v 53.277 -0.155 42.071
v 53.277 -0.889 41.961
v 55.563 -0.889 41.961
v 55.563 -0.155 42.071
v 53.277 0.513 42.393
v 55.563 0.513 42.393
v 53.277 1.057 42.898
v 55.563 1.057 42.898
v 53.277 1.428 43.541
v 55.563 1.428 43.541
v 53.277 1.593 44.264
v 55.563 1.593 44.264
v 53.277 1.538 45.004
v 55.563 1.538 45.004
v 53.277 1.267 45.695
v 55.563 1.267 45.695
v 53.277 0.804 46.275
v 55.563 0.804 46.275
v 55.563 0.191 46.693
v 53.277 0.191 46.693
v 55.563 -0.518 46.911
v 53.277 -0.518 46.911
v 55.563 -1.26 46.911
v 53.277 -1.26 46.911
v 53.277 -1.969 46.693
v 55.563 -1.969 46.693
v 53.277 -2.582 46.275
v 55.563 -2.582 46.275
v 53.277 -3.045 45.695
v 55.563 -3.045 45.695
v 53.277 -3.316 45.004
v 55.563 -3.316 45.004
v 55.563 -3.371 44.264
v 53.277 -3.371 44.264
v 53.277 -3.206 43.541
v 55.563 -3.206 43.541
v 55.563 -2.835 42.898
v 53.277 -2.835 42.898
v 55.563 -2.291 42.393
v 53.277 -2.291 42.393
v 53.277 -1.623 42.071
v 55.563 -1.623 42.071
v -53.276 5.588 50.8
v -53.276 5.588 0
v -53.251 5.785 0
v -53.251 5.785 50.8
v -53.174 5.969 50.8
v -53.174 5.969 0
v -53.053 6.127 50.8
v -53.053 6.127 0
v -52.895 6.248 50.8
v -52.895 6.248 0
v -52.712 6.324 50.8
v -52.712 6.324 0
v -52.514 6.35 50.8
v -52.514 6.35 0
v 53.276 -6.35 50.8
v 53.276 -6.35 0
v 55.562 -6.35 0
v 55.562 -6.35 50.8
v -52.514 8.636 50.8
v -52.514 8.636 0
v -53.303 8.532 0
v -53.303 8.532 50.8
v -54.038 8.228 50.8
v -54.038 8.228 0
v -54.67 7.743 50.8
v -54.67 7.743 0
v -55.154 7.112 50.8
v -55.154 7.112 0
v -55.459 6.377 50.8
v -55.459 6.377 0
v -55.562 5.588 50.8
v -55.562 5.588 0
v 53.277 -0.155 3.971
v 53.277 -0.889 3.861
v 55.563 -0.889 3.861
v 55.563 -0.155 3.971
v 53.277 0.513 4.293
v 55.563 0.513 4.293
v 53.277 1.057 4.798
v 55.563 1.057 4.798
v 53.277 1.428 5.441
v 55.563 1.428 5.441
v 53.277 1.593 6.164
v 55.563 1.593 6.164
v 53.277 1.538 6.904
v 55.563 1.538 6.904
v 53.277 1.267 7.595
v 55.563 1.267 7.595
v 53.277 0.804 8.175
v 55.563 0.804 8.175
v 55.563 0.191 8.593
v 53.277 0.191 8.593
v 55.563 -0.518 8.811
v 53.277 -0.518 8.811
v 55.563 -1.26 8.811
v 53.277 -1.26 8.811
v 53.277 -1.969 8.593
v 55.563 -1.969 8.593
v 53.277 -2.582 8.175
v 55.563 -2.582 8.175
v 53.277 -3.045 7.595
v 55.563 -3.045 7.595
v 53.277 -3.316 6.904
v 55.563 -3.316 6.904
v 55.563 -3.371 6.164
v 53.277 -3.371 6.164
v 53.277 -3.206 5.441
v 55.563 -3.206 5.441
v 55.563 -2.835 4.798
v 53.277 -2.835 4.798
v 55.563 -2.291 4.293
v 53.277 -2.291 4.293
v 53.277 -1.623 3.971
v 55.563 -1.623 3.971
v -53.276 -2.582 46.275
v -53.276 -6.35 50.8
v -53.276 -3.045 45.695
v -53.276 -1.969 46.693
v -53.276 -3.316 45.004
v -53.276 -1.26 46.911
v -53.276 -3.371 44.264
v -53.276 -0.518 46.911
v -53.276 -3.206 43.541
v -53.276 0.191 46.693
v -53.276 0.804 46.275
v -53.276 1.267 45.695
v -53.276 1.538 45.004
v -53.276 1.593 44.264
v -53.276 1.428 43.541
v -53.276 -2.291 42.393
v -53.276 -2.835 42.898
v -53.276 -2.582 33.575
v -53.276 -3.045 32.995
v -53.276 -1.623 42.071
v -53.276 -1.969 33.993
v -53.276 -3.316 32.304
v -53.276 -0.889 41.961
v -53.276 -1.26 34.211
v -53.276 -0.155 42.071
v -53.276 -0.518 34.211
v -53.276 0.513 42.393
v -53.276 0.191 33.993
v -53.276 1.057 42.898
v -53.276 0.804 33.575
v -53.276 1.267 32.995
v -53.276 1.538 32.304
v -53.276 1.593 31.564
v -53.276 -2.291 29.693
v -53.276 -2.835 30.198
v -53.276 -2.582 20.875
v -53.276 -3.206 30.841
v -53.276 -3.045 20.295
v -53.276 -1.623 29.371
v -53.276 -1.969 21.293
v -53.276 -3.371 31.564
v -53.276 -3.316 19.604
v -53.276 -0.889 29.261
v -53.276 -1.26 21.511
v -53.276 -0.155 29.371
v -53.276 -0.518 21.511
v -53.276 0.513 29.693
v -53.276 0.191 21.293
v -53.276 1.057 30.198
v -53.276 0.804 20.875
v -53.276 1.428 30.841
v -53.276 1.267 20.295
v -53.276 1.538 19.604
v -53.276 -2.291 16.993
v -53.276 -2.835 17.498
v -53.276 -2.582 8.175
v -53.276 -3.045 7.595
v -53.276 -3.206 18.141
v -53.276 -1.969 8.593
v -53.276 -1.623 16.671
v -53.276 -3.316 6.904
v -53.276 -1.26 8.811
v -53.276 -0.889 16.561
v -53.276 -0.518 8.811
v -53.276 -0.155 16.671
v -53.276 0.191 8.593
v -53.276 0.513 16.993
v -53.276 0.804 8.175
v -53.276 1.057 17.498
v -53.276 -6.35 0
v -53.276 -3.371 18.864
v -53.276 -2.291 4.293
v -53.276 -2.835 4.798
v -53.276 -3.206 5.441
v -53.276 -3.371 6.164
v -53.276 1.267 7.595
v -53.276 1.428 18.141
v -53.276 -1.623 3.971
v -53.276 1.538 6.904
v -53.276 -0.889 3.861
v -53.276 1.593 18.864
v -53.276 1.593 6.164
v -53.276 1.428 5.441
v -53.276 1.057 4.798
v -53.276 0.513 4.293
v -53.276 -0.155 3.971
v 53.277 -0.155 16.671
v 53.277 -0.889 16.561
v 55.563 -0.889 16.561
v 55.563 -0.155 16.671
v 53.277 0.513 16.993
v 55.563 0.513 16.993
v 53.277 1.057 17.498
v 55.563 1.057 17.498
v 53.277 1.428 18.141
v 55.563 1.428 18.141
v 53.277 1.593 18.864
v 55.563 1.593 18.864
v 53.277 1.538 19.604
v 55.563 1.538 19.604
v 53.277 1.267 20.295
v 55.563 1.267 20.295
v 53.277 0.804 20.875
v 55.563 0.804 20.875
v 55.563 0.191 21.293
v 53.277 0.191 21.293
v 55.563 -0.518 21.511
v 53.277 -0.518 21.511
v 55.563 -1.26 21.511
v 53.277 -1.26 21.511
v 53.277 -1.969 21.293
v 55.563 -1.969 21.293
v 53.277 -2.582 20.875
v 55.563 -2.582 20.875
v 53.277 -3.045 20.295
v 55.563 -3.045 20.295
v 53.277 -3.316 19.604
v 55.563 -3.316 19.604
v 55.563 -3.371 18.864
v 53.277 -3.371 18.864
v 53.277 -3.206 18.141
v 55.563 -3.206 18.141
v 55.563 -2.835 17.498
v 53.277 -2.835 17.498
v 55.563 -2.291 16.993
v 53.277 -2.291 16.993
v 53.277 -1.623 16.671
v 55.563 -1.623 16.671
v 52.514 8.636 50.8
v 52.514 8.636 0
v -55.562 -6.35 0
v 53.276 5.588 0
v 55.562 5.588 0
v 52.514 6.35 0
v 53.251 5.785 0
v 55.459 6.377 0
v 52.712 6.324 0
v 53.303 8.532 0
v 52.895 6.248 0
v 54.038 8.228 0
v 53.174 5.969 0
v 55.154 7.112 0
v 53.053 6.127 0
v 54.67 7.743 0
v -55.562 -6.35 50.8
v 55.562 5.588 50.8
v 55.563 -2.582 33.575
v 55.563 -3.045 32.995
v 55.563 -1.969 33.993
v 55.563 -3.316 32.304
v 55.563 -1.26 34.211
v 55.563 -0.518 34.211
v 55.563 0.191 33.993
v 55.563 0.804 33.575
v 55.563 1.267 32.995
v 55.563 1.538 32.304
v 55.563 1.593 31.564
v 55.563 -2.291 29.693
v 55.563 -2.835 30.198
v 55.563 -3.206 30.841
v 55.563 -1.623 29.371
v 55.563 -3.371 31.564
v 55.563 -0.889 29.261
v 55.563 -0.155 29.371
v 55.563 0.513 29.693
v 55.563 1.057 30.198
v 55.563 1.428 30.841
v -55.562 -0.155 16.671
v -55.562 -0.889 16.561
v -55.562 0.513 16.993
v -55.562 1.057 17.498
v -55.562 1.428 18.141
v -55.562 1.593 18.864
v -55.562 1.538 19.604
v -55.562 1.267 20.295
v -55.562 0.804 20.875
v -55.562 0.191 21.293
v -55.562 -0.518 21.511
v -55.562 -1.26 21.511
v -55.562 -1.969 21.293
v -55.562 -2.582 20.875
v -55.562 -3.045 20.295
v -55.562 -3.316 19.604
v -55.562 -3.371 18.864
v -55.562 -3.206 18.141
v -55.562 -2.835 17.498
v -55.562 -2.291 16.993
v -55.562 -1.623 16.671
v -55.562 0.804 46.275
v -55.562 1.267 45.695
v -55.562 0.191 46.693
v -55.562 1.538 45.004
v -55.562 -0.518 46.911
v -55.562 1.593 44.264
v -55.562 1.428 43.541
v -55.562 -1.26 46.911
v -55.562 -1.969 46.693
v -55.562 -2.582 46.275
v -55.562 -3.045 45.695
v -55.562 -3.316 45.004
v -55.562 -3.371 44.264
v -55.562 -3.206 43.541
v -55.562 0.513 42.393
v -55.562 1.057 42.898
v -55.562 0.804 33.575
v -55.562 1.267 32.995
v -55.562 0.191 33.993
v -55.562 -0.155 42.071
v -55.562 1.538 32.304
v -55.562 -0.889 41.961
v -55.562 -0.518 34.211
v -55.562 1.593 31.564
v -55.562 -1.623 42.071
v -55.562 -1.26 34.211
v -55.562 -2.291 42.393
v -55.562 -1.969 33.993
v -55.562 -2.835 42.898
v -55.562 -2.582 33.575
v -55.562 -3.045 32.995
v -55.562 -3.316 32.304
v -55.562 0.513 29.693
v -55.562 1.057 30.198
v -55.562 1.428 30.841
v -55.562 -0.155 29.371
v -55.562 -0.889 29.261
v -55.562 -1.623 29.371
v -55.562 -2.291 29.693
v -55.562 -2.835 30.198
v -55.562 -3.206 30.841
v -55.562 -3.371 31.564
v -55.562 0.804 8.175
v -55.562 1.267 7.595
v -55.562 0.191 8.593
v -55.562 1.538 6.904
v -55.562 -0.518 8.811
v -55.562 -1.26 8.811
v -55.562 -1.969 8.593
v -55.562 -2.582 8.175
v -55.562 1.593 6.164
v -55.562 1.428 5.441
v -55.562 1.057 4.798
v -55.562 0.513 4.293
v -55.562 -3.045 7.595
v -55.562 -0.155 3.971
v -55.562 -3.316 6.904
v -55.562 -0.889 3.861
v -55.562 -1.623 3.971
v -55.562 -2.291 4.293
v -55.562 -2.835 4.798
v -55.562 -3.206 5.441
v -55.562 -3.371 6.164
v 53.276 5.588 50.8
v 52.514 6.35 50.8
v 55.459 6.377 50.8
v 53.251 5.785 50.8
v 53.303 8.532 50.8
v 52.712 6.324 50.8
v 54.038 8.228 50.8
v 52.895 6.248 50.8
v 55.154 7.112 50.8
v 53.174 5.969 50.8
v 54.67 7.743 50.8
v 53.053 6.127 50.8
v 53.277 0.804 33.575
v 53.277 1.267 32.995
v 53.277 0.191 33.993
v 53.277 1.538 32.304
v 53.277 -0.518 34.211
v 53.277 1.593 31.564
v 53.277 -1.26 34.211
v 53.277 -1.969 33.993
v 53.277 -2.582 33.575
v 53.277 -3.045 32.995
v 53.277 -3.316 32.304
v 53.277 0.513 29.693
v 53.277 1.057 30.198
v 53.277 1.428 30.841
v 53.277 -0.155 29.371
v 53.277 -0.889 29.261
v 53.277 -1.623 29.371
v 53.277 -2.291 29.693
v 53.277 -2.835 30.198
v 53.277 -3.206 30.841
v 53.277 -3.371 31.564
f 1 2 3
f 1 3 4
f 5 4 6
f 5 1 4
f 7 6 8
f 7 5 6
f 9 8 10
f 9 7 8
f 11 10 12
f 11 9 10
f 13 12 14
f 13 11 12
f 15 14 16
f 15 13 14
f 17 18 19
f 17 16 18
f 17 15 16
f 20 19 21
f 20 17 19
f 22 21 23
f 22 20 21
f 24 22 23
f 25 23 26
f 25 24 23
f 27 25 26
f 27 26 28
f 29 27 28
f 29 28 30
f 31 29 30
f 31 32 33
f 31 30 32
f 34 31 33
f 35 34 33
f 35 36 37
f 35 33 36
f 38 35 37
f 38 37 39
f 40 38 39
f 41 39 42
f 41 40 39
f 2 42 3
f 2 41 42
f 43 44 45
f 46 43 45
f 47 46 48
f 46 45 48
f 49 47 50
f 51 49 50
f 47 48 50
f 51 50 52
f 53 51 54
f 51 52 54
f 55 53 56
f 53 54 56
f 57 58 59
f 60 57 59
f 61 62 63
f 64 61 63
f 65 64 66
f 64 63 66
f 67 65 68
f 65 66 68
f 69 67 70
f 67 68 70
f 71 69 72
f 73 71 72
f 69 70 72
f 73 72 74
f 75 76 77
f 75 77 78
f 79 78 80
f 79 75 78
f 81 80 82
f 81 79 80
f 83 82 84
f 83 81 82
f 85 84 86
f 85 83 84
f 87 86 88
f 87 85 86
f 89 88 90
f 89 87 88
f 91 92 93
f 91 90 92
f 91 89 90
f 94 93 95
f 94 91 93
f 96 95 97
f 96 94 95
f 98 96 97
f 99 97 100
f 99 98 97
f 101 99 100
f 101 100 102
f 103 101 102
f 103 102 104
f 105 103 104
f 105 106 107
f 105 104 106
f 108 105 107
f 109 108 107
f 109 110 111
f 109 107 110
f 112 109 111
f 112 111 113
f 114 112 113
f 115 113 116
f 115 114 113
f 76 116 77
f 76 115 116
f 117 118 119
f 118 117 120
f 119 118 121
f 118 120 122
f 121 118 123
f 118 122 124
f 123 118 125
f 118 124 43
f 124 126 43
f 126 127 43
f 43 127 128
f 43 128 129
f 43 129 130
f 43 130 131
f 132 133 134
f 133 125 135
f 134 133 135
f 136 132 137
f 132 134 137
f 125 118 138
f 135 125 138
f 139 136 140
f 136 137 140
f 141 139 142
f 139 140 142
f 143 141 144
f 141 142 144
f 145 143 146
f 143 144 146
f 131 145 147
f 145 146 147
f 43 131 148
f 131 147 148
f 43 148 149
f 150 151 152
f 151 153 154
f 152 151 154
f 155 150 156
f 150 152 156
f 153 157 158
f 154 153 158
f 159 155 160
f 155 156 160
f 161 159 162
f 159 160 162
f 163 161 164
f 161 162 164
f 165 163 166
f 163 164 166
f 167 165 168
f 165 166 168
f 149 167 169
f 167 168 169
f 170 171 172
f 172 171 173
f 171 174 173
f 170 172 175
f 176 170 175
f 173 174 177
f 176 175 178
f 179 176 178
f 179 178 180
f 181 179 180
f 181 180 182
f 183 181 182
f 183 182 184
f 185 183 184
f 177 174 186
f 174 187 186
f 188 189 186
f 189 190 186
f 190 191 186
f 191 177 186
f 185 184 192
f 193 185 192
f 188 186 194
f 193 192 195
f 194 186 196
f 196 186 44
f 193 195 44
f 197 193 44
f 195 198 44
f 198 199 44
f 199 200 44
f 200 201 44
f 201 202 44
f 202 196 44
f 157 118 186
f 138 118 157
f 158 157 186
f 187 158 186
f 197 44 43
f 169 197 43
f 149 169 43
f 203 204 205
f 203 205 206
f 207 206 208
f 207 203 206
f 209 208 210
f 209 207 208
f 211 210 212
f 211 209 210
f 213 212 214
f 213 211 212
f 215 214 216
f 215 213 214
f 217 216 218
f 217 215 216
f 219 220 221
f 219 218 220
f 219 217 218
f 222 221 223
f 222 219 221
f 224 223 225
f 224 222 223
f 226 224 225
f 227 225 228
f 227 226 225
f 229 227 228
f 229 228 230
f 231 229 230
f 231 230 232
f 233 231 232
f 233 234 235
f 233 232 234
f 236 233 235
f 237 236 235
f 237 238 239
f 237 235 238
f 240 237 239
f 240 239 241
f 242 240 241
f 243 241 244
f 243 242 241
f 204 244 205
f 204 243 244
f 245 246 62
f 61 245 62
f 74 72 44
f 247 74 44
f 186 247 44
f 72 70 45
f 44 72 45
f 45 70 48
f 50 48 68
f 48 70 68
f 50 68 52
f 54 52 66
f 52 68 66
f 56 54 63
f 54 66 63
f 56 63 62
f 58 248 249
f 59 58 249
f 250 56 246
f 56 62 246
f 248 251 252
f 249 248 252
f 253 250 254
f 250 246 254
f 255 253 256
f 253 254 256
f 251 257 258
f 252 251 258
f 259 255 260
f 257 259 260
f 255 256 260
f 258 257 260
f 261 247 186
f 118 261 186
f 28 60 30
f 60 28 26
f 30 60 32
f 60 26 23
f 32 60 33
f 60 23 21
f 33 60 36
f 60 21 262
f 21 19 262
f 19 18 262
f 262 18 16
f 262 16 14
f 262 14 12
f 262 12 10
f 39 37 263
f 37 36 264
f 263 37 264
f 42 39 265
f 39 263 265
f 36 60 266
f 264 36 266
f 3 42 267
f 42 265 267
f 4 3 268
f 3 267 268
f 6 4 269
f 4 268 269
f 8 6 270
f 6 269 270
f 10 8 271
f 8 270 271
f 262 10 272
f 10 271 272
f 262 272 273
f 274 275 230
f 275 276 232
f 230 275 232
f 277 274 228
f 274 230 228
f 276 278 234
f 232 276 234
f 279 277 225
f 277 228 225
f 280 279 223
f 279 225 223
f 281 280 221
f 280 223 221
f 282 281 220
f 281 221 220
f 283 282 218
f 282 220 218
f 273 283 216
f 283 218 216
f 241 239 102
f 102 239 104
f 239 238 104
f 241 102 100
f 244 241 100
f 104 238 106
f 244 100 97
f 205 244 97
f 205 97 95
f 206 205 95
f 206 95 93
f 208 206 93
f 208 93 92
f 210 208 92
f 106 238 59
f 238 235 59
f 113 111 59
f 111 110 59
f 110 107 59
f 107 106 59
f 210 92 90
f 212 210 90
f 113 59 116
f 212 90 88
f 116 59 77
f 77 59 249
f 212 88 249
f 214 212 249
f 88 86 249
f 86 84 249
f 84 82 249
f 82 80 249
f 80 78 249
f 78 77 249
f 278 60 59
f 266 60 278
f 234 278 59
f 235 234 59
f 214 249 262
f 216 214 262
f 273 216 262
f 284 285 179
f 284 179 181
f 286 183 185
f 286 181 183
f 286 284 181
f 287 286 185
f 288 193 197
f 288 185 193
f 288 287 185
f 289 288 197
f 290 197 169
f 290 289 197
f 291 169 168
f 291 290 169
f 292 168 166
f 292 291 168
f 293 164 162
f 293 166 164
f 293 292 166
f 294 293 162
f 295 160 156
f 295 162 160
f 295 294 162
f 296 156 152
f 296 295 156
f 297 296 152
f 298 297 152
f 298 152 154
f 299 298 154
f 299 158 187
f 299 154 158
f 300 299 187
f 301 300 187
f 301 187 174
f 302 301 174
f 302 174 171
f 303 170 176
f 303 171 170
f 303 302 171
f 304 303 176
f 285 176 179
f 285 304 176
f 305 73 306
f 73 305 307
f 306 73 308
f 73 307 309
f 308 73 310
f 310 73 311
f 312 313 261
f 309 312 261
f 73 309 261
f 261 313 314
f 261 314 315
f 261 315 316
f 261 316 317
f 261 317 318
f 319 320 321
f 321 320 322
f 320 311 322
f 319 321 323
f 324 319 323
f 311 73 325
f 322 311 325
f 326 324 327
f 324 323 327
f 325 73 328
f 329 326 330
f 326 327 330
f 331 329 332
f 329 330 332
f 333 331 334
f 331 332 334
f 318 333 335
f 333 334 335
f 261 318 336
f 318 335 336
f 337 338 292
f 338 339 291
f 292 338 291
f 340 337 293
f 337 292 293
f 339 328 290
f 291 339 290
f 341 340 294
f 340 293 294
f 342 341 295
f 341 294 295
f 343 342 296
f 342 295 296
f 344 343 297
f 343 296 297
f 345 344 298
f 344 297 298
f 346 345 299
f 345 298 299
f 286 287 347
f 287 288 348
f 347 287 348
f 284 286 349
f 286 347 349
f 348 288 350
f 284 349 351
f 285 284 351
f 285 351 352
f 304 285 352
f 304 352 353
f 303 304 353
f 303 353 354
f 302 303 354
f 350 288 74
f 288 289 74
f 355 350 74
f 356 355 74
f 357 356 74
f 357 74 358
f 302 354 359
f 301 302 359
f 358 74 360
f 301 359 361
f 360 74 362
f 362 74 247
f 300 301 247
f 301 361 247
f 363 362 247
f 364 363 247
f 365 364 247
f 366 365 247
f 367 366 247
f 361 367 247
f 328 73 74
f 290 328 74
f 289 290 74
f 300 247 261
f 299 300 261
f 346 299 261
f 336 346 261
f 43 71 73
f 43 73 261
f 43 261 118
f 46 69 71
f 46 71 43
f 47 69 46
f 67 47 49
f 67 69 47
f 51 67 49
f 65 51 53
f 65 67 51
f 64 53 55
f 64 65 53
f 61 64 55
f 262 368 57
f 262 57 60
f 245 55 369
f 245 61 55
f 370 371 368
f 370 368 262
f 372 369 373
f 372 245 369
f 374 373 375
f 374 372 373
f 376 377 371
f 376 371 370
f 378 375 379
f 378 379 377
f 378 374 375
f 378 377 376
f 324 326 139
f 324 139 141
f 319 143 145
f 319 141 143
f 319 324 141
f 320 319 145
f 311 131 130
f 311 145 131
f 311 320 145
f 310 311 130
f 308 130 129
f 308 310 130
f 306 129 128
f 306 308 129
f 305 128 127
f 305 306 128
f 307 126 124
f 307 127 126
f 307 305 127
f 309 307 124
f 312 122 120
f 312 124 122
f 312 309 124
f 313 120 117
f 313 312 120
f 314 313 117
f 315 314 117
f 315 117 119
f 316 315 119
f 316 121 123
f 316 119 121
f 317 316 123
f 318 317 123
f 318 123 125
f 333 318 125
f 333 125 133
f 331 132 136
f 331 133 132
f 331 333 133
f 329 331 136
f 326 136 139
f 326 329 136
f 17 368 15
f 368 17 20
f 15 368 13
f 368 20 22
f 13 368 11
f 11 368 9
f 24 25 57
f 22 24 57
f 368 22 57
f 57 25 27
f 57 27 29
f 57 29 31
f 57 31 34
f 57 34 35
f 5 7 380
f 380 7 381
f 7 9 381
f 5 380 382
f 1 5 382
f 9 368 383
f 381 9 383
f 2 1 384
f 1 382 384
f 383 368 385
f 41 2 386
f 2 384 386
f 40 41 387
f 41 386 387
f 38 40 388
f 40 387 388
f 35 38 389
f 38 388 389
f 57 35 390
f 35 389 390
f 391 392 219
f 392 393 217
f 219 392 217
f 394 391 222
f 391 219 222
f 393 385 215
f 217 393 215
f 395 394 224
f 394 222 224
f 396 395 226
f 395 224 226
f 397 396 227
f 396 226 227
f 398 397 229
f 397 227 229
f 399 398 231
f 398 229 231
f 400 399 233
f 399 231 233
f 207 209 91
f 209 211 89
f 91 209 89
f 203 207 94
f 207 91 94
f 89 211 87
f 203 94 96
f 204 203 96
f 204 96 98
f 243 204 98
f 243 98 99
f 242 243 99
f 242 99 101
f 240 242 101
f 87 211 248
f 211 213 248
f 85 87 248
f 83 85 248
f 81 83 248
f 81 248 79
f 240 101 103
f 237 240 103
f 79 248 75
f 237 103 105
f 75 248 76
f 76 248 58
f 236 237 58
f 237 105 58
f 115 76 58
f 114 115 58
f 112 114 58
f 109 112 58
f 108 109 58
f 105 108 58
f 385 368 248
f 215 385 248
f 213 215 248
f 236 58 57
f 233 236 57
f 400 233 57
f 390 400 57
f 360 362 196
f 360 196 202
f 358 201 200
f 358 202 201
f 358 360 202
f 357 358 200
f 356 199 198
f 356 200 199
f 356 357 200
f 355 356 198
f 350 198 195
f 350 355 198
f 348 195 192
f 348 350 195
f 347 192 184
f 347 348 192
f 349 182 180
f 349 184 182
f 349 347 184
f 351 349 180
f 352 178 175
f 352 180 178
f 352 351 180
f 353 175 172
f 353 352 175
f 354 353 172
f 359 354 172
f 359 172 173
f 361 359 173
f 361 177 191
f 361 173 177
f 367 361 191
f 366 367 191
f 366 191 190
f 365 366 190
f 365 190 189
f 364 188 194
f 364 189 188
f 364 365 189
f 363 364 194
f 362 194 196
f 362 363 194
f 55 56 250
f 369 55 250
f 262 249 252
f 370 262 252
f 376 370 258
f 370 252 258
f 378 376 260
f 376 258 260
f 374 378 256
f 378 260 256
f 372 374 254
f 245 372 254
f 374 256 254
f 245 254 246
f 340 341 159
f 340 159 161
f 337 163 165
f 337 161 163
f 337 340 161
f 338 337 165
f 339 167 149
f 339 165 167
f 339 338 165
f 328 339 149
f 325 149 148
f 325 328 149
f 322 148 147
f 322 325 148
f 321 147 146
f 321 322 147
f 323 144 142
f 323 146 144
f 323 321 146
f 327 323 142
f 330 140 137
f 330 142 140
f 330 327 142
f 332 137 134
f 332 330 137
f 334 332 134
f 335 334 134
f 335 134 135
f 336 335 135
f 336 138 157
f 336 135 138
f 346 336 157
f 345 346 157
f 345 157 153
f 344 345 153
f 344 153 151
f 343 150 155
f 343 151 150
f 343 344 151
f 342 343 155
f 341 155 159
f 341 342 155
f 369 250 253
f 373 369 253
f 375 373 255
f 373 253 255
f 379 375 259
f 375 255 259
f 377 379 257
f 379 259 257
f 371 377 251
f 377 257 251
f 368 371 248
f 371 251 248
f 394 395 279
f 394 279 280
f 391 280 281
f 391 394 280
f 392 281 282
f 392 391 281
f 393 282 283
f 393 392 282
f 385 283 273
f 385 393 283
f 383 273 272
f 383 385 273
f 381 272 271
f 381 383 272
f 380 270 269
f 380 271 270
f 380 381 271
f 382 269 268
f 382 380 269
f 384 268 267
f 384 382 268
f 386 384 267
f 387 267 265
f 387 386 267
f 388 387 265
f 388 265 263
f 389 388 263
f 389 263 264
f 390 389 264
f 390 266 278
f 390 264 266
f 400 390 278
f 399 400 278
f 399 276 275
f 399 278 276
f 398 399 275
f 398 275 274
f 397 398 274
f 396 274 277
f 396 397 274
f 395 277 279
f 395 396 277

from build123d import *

# Parameters (mm, degrees)
BASE_FLANGE1_DEPTH      = 50.8
CUT_EXTRUDE1_DEPTH      = 76.778703488
CUT_EXTRUDE1_DEPTH_BACK = 76.778703488
SKETCH6_R               = 2.4892


# Sheet-metal steps are written as plain solids
with BuildPart() as part:
    # Sketch1 → Base-Flange1 (new body)
    with BuildSketch(Plane.XY):
        with BuildLine():
            Line((-53.2765, -6.35), (-53.2765, 5.588))
            ThreePointArc((-53.2765, 5.588), (-53.053315367, 6.126815367), (-52.5145, 6.35))
            Line((-52.5145, 6.35), (52.5145, 6.35))
            ThreePointArc((52.5145, 6.35), (53.053315367, 6.126815367), (53.2765, 5.588))
            Line((53.2765, 5.588), (53.2765, -6.35))
            Line((53.2765, -6.35), (55.5625, -6.35))
            Line((55.5625, -6.35), (55.5625, 5.588))
            ThreePointArc((55.5625, 5.588), (54.669761469, 7.743261469), (52.5145, 8.636))
            Line((52.5145, 8.636), (-52.5145, 8.636))
            ThreePointArc((-52.5145, 8.636), (-54.669761469, 7.743261469), (-55.5625, 5.588))
            Line((-55.5625, 5.588), (-55.5625, -6.35))
            Line((-55.5625, -6.35), (-53.2765, -6.35))
        make_face()
    extrude(amount=BASE_FLANGE1_DEPTH)

    # Sketch6 → Cut-Extrude1 (cut, two sides: drawn at the far end of the back side and taken through both)
    with BuildSketch(Plane(origin=(0, 0, 0), x_dir=(0, 0, -1), z_dir=(1, 0, 0)).offset(-CUT_EXTRUDE1_DEPTH_BACK)):
        with Locations((-6.35, -0.888959106)):
            Circle(SKETCH6_R)
        with Locations((-19.05, -0.888959106)):
            Circle(SKETCH6_R)
        with Locations((-31.75, -0.888959106)):
            Circle(SKETCH6_R)
        with Locations((-44.45, -0.888959106)):
            Circle(SKETCH6_R)
    extrude(amount=CUT_EXTRUDE1_DEPTH + CUT_EXTRUDE1_DEPTH_BACK, mode=Mode.SUBTRACT)


solid = part.part
